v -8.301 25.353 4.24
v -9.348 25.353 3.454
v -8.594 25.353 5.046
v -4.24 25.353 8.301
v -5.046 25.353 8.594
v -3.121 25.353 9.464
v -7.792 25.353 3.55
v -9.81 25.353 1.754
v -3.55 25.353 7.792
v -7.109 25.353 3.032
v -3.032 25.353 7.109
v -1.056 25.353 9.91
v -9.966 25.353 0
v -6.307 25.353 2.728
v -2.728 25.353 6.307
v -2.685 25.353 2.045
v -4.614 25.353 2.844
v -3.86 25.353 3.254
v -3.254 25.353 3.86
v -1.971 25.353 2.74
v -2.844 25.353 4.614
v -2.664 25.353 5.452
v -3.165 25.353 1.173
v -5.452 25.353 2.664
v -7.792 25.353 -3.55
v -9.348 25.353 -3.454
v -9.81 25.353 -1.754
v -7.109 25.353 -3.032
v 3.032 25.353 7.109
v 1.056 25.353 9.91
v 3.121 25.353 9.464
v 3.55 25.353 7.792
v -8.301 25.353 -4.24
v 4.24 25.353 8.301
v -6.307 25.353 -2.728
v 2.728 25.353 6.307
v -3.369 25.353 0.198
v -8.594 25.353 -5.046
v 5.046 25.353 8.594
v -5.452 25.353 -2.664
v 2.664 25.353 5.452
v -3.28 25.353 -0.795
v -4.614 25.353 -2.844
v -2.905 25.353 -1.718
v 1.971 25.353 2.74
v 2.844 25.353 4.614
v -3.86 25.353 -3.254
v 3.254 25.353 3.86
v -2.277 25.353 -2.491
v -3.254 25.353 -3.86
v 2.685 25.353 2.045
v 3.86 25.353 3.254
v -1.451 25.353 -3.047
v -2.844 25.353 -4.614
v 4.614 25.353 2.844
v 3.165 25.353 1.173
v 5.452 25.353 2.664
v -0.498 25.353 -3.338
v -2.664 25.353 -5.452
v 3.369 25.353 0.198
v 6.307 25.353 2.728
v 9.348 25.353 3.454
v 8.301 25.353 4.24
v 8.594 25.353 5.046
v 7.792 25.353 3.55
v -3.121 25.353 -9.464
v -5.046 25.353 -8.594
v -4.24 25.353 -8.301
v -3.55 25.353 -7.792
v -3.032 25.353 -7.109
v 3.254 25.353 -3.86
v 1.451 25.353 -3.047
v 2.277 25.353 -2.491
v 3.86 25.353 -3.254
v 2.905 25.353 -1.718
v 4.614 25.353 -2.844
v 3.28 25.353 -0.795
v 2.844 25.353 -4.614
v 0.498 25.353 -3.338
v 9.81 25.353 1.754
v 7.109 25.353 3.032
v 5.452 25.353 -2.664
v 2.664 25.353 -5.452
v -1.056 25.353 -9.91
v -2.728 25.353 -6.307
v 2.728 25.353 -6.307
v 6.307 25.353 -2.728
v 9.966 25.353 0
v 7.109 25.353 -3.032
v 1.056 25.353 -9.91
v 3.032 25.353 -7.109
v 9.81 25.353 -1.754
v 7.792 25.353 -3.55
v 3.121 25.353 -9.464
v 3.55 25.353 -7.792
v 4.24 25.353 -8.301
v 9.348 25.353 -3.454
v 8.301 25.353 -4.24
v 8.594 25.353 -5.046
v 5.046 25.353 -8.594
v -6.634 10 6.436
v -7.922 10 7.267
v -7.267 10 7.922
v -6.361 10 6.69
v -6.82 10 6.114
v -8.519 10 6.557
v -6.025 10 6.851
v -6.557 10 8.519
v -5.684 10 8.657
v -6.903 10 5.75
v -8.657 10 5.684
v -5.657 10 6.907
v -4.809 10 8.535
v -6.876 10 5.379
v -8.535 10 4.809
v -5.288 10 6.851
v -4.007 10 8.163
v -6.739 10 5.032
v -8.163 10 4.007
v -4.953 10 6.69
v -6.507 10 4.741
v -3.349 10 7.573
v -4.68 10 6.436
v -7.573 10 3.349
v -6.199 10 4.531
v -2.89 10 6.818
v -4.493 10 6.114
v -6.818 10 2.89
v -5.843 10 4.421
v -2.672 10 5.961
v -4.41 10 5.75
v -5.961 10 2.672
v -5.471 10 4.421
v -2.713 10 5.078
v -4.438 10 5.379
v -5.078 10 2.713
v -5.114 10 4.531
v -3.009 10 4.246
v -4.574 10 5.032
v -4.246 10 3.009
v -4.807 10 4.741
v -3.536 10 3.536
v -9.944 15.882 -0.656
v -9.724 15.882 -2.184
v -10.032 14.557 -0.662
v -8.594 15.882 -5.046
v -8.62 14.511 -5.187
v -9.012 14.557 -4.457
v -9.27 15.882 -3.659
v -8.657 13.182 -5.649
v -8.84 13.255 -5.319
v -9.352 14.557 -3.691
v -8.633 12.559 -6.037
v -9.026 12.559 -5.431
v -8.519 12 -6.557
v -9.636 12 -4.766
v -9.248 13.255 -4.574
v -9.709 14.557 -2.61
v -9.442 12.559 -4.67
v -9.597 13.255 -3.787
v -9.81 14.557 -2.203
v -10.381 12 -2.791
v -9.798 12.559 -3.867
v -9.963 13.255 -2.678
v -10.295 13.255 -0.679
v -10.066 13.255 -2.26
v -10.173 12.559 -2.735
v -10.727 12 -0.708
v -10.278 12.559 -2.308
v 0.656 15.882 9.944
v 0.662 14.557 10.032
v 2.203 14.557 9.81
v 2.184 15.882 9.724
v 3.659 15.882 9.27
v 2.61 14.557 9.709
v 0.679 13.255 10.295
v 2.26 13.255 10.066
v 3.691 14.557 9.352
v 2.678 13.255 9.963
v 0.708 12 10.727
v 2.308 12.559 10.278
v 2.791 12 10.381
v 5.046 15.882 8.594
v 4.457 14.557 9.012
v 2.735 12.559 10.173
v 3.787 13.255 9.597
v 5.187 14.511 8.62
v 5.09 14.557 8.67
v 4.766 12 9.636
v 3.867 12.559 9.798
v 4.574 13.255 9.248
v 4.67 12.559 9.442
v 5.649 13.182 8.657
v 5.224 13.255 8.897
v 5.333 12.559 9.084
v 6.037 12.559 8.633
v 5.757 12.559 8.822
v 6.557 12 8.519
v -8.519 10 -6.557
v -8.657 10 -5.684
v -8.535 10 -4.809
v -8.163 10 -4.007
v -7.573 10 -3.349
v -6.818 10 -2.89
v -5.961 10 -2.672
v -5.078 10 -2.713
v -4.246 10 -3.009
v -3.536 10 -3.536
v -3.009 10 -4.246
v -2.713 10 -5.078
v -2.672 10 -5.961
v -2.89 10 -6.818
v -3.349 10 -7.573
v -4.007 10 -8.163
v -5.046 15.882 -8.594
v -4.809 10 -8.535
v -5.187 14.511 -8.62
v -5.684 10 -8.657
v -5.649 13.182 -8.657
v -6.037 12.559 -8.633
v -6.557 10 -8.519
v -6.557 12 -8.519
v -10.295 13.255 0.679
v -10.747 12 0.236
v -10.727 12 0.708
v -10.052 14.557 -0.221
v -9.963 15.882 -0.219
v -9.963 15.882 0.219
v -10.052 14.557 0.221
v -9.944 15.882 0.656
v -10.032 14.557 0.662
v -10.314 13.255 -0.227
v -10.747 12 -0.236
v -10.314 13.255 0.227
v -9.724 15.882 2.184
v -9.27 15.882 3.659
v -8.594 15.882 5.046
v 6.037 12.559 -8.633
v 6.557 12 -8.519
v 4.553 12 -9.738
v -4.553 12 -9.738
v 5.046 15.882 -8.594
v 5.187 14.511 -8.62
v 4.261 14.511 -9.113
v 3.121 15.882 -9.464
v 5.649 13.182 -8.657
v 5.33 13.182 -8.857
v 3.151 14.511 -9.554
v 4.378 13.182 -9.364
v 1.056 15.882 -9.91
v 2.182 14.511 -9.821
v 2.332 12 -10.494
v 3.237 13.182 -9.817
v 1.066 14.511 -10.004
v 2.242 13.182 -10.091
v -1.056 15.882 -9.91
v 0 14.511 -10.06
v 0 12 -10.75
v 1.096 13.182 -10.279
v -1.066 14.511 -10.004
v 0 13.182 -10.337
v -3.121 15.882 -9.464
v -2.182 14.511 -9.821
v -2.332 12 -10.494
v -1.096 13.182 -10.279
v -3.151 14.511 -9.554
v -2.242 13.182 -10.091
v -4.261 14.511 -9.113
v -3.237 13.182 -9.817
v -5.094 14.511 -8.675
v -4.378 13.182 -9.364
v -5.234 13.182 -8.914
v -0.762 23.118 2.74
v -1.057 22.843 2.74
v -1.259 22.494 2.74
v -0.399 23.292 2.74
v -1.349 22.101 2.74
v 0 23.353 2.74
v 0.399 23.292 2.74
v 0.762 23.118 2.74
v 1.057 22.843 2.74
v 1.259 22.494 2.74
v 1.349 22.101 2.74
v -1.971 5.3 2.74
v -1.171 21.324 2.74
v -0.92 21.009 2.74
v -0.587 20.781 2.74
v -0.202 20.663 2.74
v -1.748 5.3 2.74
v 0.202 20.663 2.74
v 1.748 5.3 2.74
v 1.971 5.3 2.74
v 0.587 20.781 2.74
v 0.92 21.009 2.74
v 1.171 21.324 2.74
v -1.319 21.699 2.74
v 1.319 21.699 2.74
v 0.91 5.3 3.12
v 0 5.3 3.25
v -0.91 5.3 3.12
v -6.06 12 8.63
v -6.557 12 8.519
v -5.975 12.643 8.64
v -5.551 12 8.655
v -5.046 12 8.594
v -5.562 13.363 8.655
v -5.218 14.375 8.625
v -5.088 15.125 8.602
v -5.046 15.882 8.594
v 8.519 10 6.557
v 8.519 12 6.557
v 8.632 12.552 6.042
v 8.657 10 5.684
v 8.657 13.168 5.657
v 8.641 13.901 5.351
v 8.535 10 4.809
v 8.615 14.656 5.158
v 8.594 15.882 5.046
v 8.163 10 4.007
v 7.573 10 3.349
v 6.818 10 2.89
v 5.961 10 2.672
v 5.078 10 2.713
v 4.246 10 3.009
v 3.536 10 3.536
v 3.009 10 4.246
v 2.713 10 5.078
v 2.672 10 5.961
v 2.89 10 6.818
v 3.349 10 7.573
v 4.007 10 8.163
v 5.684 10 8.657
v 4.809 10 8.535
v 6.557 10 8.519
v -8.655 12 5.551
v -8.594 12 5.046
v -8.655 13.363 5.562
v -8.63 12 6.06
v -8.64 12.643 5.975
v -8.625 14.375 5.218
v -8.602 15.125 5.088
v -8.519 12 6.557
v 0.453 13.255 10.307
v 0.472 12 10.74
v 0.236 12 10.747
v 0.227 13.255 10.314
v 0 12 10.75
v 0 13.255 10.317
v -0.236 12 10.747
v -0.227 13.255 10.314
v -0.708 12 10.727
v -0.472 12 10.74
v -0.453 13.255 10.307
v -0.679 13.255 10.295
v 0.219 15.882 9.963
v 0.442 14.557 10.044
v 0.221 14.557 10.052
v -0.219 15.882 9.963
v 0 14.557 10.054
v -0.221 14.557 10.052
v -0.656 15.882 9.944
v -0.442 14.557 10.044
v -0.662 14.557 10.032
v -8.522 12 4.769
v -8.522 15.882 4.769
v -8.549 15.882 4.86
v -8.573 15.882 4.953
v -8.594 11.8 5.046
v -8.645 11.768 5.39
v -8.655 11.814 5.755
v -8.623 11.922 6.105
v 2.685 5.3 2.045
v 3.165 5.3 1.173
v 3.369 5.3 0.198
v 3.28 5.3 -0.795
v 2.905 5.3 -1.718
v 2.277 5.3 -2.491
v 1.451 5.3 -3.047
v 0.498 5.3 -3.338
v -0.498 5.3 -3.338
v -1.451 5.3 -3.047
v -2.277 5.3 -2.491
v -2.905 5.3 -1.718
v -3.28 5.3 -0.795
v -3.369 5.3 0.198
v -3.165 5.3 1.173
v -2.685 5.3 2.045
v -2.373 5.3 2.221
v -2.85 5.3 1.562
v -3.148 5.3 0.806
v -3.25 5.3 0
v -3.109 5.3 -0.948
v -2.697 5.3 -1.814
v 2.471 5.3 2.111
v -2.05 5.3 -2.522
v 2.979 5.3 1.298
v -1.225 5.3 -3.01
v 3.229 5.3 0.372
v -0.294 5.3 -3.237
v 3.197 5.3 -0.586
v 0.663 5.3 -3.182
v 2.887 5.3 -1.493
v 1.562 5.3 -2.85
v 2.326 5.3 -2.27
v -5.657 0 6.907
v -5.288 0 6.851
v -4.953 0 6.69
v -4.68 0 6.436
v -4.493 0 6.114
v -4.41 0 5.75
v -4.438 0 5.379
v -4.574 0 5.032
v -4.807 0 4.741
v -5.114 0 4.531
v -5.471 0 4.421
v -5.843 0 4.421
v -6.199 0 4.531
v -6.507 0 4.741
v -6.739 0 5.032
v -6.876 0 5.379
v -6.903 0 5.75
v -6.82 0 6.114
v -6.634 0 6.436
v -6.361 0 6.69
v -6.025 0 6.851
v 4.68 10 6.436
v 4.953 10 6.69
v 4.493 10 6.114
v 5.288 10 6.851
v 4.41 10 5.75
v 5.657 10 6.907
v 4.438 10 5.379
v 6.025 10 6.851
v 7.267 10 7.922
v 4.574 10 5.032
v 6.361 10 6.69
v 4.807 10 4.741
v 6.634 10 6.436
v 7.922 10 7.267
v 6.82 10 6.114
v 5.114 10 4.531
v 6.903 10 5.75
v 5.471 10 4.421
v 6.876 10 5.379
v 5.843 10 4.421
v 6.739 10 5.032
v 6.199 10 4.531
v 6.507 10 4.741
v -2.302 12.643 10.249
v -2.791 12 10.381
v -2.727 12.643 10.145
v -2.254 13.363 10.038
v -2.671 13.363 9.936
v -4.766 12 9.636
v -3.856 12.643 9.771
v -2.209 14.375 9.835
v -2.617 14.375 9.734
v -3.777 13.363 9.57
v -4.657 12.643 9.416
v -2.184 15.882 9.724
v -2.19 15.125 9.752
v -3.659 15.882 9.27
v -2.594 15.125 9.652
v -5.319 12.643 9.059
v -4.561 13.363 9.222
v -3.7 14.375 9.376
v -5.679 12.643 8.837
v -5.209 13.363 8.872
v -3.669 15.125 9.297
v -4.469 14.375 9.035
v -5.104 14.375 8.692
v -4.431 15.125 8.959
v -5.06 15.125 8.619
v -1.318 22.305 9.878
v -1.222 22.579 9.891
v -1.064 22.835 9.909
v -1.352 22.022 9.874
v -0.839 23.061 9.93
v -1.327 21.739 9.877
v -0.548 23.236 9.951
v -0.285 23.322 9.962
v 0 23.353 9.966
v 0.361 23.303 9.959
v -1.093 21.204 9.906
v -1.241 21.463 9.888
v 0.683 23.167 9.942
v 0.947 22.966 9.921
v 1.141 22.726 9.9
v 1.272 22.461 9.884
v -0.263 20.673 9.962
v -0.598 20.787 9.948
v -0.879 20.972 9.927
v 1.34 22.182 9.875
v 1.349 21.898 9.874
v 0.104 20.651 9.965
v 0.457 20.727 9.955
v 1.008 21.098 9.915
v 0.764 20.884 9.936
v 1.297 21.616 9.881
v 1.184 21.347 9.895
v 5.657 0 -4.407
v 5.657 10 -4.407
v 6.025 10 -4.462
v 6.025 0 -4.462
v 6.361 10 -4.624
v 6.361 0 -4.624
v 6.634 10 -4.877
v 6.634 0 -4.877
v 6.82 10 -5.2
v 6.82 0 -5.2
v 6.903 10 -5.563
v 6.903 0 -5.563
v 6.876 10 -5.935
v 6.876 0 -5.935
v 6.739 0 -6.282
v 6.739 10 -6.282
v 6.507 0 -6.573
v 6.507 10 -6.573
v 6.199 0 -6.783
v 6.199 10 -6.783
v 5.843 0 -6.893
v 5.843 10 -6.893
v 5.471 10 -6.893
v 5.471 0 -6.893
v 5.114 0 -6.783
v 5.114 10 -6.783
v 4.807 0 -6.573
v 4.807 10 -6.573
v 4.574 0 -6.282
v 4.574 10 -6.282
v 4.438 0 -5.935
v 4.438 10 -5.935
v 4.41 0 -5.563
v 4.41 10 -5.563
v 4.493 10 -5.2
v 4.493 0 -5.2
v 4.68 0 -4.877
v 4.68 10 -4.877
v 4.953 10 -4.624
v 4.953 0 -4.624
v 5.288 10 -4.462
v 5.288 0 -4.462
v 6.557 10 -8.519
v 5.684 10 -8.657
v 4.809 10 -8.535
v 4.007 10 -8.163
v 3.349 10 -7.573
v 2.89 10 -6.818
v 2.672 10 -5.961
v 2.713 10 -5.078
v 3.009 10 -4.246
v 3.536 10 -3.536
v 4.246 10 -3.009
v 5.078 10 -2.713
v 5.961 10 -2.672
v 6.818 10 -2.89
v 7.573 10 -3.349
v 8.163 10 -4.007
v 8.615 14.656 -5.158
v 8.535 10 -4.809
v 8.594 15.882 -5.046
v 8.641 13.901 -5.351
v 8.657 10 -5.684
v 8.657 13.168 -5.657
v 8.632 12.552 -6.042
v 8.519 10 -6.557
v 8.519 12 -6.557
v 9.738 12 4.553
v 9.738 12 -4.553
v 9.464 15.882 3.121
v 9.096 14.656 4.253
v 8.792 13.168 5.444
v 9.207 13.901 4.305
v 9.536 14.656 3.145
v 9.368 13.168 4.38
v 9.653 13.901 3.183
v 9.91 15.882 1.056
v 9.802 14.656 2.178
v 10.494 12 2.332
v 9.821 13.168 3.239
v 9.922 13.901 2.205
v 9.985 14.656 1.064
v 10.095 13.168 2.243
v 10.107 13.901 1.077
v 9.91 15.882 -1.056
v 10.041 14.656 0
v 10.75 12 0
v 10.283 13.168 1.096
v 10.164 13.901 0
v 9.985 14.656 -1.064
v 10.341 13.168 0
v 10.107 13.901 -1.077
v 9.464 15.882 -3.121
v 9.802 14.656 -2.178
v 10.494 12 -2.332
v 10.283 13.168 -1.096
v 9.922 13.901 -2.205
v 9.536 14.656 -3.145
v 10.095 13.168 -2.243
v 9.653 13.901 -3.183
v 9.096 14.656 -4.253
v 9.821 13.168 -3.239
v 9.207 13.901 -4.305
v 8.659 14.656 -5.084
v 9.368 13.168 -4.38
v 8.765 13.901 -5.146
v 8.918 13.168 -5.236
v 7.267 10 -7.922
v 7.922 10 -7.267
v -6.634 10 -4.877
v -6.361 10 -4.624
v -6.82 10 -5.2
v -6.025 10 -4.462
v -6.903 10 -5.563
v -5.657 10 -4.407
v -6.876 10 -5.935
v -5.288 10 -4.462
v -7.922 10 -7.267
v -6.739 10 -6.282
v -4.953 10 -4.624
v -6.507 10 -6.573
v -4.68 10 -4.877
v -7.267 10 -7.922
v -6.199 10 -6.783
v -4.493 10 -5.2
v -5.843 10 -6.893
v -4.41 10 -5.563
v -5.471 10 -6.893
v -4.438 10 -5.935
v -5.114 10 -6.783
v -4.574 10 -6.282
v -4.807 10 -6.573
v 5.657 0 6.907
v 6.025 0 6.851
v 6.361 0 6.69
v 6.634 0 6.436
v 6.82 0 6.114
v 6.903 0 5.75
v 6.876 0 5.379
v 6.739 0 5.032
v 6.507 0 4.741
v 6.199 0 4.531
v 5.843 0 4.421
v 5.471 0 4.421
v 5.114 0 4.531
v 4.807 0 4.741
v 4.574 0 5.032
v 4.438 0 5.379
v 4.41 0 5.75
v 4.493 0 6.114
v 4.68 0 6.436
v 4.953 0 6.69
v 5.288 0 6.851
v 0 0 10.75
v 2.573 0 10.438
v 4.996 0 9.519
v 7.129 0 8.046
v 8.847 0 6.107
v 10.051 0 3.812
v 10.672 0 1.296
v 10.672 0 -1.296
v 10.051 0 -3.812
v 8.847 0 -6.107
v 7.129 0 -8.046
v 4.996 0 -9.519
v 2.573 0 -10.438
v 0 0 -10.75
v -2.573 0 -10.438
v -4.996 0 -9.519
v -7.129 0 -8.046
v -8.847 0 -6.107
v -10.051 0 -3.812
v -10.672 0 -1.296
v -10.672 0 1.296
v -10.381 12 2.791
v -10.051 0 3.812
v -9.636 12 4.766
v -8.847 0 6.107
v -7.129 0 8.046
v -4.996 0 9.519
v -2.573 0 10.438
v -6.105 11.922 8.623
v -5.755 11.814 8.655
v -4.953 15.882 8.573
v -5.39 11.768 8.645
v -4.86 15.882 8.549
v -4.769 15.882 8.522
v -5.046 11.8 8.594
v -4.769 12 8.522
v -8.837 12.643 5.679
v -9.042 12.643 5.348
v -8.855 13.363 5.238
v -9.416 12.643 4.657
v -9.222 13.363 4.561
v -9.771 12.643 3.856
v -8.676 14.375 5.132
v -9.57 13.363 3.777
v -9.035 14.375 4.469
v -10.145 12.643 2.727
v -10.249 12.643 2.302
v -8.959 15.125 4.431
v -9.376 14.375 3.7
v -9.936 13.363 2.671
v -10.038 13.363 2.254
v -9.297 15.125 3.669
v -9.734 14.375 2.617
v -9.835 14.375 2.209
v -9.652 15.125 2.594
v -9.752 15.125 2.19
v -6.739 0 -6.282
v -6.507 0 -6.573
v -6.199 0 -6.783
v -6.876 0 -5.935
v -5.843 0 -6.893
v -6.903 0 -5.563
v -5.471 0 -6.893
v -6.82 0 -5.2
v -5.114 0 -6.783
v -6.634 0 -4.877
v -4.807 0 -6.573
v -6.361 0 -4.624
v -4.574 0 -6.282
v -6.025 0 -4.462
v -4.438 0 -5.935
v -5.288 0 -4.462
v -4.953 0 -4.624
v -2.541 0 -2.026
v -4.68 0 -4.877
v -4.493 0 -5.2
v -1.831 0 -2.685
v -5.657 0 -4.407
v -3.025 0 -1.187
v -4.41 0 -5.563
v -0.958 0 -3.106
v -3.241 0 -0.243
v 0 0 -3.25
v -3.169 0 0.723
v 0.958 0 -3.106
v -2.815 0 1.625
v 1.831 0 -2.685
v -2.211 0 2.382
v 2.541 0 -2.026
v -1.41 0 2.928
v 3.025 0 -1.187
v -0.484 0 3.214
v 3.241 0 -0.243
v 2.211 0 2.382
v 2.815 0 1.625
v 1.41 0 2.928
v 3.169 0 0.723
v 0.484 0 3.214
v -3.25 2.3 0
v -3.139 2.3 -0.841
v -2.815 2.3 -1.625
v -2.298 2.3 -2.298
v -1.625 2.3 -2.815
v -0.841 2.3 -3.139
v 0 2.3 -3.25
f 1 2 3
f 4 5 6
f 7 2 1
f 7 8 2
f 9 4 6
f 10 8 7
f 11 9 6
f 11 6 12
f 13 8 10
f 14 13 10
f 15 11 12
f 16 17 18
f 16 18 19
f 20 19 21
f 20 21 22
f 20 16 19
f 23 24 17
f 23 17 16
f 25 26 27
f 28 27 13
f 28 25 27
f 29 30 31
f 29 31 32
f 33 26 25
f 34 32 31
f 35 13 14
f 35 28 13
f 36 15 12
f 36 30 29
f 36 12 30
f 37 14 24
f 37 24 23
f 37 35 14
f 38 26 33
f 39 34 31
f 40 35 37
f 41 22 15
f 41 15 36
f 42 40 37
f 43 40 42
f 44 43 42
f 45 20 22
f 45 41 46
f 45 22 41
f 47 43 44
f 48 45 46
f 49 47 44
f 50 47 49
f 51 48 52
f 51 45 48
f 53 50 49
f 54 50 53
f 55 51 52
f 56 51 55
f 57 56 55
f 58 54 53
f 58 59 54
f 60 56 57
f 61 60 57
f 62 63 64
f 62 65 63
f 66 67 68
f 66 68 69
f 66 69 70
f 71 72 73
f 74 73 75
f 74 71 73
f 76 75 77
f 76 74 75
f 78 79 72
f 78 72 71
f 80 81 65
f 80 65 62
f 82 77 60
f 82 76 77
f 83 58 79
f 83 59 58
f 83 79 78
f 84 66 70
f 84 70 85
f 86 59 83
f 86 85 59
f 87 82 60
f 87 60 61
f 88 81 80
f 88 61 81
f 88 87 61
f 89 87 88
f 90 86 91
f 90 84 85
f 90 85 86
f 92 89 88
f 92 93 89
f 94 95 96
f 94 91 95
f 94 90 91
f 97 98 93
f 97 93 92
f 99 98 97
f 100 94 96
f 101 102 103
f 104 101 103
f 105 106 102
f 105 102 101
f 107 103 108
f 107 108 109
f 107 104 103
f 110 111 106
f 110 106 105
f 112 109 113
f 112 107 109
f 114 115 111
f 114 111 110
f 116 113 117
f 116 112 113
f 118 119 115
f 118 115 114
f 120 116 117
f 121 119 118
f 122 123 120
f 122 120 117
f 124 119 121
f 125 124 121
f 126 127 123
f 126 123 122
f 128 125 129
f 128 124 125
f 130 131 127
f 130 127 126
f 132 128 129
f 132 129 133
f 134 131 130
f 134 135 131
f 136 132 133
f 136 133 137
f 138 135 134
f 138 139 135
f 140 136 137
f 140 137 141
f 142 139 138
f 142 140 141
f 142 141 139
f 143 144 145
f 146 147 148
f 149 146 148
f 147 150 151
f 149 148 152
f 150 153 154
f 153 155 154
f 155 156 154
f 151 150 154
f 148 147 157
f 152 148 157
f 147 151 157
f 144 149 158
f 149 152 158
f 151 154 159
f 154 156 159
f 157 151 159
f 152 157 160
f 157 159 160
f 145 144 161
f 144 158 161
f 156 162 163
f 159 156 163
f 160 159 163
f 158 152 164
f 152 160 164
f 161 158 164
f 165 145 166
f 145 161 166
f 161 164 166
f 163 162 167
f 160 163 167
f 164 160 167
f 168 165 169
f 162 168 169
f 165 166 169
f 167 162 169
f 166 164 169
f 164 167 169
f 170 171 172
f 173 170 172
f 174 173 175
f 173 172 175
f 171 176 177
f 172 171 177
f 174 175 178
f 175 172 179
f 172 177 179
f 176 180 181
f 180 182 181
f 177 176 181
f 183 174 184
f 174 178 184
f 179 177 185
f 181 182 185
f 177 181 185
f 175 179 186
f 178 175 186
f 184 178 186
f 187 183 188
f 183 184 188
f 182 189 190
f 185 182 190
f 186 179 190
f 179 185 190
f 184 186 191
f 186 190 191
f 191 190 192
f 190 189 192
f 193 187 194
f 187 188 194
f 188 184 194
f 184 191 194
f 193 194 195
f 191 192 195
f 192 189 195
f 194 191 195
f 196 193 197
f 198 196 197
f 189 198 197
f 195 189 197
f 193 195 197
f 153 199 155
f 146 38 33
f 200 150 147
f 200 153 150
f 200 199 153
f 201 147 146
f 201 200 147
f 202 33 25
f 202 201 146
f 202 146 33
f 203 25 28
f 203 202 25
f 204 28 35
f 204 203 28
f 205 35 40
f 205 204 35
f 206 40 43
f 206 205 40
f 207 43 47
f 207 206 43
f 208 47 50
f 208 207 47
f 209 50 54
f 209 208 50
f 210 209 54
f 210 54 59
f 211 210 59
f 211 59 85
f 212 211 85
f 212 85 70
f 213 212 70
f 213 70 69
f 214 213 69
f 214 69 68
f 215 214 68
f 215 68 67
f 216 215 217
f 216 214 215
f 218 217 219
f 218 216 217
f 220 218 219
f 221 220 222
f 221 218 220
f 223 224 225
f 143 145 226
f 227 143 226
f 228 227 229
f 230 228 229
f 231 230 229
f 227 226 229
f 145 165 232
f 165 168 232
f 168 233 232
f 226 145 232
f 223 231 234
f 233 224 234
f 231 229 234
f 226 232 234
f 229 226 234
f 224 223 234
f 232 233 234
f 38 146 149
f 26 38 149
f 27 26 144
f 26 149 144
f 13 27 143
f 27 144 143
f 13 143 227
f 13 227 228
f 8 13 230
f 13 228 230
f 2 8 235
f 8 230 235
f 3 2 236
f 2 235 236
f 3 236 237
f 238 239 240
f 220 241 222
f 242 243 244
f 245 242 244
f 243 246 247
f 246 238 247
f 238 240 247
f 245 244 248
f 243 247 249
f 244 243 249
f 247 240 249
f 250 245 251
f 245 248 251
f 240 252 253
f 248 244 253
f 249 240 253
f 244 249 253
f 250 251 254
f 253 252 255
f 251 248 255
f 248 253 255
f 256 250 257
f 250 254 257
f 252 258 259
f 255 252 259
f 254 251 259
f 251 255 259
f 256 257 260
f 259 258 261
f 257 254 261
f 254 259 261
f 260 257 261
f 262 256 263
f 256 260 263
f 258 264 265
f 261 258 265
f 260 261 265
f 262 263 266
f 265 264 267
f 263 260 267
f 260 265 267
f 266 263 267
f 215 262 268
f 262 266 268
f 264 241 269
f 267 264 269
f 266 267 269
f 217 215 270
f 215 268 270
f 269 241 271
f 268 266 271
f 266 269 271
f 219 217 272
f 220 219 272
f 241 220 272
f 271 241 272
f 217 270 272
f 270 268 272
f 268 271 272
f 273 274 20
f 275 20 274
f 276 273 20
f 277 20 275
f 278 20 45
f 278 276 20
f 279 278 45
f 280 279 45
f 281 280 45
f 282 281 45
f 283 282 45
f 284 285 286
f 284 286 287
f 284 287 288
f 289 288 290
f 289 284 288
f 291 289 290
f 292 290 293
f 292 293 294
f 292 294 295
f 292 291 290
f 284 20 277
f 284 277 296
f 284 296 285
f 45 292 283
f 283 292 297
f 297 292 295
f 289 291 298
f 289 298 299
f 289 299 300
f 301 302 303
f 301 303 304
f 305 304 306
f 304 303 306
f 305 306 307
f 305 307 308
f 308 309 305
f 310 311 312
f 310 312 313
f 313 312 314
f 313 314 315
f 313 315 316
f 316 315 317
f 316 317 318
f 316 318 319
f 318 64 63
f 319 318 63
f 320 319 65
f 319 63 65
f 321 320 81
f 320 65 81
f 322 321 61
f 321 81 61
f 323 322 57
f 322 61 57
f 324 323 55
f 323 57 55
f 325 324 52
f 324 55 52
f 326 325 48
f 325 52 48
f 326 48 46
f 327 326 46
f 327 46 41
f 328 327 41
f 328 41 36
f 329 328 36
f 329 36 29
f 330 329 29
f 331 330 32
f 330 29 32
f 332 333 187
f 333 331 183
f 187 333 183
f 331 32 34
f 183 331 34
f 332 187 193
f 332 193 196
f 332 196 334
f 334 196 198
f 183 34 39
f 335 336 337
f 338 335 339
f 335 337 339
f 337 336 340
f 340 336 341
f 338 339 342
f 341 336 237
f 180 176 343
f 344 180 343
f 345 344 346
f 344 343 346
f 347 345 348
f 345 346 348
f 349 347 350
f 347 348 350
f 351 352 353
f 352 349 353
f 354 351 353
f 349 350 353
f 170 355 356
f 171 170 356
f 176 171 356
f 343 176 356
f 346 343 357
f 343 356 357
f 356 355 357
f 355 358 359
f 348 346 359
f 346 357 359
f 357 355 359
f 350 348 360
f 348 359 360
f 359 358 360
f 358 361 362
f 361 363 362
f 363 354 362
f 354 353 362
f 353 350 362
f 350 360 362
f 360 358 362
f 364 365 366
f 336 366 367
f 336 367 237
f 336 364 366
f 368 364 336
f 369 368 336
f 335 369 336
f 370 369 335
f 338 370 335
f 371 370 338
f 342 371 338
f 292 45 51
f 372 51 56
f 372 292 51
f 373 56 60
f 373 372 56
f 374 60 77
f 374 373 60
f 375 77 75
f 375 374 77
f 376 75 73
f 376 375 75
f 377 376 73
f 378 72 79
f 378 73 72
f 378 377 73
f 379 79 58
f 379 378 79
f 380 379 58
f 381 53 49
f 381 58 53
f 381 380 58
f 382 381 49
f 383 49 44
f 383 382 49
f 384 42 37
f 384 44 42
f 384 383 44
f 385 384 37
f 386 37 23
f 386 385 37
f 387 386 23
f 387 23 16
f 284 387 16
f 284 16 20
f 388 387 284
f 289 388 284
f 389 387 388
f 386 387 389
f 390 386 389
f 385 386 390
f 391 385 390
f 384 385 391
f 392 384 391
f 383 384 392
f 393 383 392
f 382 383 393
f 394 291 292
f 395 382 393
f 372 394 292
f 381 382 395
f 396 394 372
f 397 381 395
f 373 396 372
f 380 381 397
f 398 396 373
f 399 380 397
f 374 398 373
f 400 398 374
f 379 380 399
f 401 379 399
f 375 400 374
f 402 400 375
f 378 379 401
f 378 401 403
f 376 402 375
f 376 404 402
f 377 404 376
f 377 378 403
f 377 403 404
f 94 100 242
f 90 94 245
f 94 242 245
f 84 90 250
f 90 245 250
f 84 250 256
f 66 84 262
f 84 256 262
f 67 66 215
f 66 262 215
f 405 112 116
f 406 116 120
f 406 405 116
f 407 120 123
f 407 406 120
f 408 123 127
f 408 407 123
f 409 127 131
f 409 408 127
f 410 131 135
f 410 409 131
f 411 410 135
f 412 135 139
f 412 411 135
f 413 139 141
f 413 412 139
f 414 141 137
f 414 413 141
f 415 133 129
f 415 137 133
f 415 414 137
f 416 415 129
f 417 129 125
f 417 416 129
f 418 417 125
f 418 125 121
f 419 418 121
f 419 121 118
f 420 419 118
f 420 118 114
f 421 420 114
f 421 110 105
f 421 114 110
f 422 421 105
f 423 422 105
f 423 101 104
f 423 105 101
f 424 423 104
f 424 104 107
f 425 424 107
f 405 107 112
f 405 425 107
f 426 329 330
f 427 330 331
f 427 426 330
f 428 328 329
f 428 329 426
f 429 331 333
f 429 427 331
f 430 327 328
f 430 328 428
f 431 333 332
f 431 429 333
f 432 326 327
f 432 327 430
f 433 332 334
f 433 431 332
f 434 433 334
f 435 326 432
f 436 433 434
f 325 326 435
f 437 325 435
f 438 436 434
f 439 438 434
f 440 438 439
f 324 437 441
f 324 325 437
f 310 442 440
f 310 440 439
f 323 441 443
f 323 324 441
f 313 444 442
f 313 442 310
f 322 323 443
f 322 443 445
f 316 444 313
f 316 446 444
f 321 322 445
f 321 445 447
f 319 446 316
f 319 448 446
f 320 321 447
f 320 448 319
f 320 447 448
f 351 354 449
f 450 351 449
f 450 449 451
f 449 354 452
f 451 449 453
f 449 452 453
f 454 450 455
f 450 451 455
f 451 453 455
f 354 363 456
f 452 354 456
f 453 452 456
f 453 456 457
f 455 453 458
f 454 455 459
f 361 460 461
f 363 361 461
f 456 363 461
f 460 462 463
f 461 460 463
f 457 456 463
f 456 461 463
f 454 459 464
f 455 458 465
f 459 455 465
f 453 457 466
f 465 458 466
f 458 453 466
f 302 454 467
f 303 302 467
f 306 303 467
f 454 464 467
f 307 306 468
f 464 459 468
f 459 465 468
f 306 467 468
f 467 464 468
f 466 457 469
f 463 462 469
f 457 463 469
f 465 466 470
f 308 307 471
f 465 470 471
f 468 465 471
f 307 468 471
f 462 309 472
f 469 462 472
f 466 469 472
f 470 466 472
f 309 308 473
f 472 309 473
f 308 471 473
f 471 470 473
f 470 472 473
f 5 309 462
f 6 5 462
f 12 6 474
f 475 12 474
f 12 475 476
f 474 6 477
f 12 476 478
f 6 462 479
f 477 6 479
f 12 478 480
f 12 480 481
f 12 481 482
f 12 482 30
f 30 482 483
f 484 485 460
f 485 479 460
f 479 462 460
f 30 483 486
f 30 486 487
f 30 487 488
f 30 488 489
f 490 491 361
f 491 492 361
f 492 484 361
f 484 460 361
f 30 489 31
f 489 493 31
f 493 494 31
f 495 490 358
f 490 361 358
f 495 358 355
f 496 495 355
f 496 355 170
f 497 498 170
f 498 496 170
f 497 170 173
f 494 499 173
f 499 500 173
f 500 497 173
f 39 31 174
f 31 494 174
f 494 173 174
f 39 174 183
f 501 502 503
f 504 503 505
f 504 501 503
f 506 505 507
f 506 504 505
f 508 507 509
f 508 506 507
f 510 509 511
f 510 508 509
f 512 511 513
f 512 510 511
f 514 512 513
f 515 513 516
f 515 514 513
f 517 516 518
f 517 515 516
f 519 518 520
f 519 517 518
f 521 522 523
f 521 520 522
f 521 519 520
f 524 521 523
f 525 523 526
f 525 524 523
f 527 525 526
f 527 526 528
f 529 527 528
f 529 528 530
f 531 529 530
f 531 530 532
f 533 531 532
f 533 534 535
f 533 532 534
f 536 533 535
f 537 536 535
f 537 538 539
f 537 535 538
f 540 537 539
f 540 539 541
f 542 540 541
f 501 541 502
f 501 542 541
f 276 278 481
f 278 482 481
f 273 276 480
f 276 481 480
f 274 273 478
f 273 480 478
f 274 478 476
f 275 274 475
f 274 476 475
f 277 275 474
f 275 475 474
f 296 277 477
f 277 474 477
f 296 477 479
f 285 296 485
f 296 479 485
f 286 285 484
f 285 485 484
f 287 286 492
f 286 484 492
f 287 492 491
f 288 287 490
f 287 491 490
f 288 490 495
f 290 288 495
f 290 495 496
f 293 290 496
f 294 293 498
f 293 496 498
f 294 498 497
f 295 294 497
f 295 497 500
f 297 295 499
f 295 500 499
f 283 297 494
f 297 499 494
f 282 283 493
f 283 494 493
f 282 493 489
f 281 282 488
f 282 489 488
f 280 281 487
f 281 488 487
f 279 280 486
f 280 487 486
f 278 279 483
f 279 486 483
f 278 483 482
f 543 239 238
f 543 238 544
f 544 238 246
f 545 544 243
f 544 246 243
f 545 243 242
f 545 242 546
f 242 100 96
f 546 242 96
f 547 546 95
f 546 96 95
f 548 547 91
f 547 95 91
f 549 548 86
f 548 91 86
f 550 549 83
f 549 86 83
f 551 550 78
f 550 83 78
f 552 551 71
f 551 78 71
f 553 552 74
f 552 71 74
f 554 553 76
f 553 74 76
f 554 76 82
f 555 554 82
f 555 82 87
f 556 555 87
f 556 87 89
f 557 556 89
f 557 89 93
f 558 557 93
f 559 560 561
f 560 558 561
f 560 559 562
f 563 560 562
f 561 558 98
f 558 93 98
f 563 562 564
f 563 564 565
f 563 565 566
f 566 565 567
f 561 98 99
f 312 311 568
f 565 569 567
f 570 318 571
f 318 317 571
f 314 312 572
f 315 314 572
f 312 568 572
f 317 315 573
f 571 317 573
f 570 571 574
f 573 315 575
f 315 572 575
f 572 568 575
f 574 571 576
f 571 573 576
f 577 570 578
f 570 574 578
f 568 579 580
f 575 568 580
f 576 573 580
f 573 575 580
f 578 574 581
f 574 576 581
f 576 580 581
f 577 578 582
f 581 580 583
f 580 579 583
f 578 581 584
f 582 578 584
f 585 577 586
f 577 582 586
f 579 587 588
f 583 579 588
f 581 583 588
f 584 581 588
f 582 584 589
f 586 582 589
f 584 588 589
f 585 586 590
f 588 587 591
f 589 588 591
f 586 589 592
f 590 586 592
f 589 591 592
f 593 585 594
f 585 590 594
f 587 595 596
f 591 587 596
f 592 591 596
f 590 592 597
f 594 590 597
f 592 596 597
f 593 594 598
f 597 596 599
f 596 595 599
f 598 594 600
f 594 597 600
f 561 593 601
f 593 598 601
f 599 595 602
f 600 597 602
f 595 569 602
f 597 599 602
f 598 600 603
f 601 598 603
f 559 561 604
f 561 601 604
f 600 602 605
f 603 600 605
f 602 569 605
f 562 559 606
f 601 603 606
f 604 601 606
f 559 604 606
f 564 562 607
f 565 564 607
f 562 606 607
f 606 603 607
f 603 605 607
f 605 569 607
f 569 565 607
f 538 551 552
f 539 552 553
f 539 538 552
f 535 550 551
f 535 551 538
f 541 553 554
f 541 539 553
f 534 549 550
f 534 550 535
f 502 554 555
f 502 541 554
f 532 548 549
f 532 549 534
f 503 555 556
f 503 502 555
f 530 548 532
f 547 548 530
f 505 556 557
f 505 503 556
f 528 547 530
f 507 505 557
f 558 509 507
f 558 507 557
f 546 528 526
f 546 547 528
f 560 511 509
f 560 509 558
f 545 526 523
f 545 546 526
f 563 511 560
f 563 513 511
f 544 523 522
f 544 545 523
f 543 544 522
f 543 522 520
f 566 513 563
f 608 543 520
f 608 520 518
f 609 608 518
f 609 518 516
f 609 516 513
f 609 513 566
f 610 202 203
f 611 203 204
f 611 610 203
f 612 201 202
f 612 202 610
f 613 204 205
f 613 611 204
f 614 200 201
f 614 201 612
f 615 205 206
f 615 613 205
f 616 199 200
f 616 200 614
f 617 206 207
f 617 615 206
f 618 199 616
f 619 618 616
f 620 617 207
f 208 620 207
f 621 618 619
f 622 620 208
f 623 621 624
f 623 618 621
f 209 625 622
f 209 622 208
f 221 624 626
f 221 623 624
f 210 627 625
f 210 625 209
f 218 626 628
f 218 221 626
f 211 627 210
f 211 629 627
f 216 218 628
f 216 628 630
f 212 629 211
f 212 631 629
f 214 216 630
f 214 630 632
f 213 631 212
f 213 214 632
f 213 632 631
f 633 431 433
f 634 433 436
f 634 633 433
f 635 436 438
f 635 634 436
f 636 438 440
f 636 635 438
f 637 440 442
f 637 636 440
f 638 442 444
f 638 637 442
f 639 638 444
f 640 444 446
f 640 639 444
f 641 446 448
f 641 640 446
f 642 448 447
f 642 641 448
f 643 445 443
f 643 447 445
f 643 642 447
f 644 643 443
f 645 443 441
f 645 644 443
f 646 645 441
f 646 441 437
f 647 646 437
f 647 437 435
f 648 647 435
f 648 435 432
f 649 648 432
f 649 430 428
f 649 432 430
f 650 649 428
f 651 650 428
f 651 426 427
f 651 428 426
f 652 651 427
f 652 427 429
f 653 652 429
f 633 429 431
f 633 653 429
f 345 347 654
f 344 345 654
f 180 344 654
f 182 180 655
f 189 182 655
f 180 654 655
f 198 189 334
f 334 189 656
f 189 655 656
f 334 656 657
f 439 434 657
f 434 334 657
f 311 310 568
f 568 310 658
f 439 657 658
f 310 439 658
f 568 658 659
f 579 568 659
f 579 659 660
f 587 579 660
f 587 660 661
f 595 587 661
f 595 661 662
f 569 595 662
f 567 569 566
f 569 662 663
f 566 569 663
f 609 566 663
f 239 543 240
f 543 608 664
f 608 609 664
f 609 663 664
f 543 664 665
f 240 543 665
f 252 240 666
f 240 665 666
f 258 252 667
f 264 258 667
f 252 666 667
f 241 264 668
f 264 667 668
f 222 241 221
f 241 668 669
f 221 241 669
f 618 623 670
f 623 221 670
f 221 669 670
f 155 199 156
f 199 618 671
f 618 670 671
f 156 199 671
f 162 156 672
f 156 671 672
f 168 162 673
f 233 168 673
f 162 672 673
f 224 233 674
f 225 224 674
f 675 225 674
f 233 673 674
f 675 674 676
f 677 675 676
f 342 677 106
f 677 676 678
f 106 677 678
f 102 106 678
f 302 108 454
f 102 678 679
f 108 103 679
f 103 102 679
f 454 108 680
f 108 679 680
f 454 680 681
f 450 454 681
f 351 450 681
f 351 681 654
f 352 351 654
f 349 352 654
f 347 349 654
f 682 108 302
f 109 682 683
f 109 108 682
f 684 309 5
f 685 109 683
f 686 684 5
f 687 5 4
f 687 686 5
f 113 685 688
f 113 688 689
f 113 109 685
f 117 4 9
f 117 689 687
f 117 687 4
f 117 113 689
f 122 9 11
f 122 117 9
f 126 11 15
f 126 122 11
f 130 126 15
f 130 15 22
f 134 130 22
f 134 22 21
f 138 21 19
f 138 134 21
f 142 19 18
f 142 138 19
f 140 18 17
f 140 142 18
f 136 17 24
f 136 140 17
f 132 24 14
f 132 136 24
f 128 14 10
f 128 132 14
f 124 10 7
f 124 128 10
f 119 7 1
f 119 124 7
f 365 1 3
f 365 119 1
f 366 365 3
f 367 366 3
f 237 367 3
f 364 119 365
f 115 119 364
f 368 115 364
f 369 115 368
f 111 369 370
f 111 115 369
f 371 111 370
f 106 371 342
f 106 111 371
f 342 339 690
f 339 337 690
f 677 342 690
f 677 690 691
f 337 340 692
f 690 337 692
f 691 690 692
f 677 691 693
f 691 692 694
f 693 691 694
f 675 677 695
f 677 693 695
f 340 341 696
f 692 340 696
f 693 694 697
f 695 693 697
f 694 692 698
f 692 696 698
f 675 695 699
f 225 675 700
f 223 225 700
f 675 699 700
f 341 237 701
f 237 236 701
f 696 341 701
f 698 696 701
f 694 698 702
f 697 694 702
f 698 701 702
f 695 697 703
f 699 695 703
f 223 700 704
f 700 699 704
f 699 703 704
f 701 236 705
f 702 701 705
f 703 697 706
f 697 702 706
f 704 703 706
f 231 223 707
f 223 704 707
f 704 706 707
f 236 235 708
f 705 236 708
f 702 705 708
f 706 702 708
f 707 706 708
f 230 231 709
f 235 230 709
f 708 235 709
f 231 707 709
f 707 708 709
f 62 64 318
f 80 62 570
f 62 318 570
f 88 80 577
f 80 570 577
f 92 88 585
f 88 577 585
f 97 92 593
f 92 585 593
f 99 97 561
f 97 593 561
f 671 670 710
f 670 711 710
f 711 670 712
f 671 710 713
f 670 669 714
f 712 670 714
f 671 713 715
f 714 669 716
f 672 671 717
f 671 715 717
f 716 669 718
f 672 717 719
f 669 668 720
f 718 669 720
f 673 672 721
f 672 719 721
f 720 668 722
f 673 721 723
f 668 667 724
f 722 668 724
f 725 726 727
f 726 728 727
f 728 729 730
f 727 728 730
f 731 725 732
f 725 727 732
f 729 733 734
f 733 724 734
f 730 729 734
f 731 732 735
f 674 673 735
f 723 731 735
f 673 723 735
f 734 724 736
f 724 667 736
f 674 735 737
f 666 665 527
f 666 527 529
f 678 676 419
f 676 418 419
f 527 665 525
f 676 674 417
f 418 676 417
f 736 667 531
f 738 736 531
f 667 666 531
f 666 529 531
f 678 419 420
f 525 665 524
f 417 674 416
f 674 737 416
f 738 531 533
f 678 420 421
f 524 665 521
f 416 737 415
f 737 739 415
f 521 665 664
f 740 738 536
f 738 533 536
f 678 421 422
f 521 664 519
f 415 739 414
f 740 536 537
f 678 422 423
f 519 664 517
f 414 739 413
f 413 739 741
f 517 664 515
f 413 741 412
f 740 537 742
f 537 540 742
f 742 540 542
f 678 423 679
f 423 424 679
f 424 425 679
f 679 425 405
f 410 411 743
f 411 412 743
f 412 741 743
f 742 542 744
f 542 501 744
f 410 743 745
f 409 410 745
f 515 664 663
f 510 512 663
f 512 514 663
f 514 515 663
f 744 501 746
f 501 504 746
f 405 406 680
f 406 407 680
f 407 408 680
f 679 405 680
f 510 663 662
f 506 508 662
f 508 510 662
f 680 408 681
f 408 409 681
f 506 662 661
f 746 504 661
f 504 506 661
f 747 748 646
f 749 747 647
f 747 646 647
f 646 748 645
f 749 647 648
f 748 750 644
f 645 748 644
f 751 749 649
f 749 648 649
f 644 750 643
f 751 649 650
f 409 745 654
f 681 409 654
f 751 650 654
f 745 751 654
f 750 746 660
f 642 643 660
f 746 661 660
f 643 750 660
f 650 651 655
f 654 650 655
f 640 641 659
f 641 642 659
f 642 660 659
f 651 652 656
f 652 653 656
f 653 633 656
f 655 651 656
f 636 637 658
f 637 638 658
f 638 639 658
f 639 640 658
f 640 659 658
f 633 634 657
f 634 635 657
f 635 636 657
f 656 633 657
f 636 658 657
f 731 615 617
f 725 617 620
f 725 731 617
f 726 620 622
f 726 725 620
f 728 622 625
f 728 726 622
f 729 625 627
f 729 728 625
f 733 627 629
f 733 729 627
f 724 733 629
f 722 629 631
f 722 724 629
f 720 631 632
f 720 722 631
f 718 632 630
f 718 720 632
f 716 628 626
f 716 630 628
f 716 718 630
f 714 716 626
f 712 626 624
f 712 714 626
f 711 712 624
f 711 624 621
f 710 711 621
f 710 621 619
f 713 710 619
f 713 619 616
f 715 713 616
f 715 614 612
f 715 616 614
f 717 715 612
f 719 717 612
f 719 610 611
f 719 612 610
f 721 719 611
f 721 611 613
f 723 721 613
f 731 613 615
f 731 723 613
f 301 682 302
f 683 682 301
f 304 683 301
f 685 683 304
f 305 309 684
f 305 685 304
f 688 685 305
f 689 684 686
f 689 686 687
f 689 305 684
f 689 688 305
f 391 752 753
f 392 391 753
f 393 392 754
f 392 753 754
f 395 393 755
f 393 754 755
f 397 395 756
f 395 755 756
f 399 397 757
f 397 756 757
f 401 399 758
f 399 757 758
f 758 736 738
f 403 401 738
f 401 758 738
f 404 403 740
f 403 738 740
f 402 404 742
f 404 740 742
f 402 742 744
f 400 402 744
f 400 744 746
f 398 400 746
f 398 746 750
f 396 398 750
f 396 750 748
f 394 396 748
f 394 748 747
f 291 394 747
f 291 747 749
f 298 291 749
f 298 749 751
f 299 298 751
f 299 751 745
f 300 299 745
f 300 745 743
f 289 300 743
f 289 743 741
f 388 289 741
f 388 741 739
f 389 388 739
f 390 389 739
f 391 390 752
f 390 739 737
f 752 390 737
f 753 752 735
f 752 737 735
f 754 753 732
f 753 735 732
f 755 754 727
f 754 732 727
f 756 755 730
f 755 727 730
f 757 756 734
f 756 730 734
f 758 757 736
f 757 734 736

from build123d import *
from build123d.topology import SkipClean

# Parameters (mm, degrees)
SKETCH1_R                      = 10.75
SKETCH1_R_2                    = 1.25
BOSS_EXTRUDE1_DEPTH            = 12
SKETCH14_R                     = 3.25
CUT_EXTRUDE3_DEPTH             = 2.3
CBORE_FOR_M3_SHCS2_D           = 3.4
CBORE_FOR_M3_SHCS2_CBORE_D     = 6.5
CBORE_FOR_M3_SHCS2_CBORE_DEPTH = 3
SKETCH3_R                      = 9.965776233
BOSS_EXTRUDE2_DEPTH            = 20
CUT_EXTRUDE2_REACH             = 37.428
CUT_EXTRUDE1_DEPTH             = 26.122201337
CUT_EXTRUDE1_DEPTH_BACK        = 2
SKETCH2_R                      = 3
SKETCH8_W                      = 1.35255
SKETCH8_H                      = 9.965776233
MOVE_START                     = 5.3
MOVE_FACE1_DEPTH               = 26.7
FILLET1_R                      = 10
CUT_EXTRUDE4_DEPTH             = 36.427743517
CUT_EXTRUDE4_DEPTH_BACK        = 36.427743517
SKETCH15_W                     = 19.931552466
SKETCH15_H                     = 6.64745


# Read off the part's stored shape, not the designer's step: Move Face1
with BuildPart() as part:
    # Sketch1 → Boss-Extrude1 (new body)
    with BuildSketch(Plane(origin=(0, 0, 0), x_dir=(1, 0, 0), z_dir=(0, 1, 0))):
        with Locations(Location((0, 0, 0), (0, 0, 270))):
            Circle(SKETCH1_R)
        with Locations(Location((-5.656854249, 5.656854249, 0), (0, 0, 270))):
            Circle(SKETCH1_R_2, mode=Mode.SUBTRACT)
        with Locations(Location((5.656854249, 5.656854249, 0), (0, 0, 270))):
            Circle(SKETCH1_R_2, mode=Mode.SUBTRACT)
        with Locations(Location((5.656854249, -5.656854249, 0), (0, 0, 270))):
            Circle(SKETCH1_R_2, mode=Mode.SUBTRACT)
        with Locations(Location((-5.656854249, -5.656854249, 0), (0, 0, 270))):
            Circle(SKETCH1_R_2, mode=Mode.SUBTRACT)
    extrude(amount=BOSS_EXTRUDE1_DEPTH)

    # Sketch14 → Cut-Extrude3 (cut)
    with BuildSketch(Plane.XZ):
        with Locations(Location((0, 0, 0), (0, 0, 270))):
            Circle(SKETCH14_R)
    extrude(amount=-CUT_EXTRUDE3_DEPTH, mode=Mode.SUBTRACT)

    # CBORE for M3 SHCS2 (through all)
    with Locations(Plane(origin=(0, 2.3, 0), x_dir=(-1, 0, 0), z_dir=(0, -1, 0))):
        with Locations((0, 0)):
            CounterBoreHole(CBORE_FOR_M3_SHCS2_D / 2, CBORE_FOR_M3_SHCS2_CBORE_D / 2, CBORE_FOR_M3_SHCS2_CBORE_DEPTH)

    # Sketch3 → Boss-Extrude2 (add)
    with BuildSketch(Plane(origin=(0, 12, 0), x_dir=(1, 0, 0), z_dir=(0, 1, 0))):
        with Locations(Location((0, 0, 0), (0, 0, 270))):
            Circle(SKETCH3_R)
    extrude(amount=BOSS_EXTRUDE2_DEPTH)

    # Sketch5 → Cut-Extrude2 (cut, up to next)
    with BuildSketch(Plane(origin=(0, 32, 0), x_dir=(1, 0, 0), z_dir=(0, 1, 0)), mode=Mode.PRIVATE) as cut_extrude2_sk1:
        with BuildLine():
            Line((-1.905, -2.54), (1.905, -2.54))
            ThreePointArc((1.905, -2.54), (0, 3.175), (-1.905, -2.54))
        make_face()
    cut_extrude2_tool1 = extrude(cut_extrude2_sk1.sketch, amount=-CUT_EXTRUDE2_REACH, mode=Mode.PRIVATE) & part.part
    add(cut_extrude2_tool1.solids().sort_by_distance((0, 32, -0.153521))[0], mode=Mode.SUBTRACT)

    # Sketch2 → Cut-Extrude1 (cut, two sides: drawn at the far end of the back side and taken through both)
    with BuildSketch(Plane(origin=(0, 12, 0), x_dir=(1, 0, 0), z_dir=(0, 1, 0)).offset(-CUT_EXTRUDE1_DEPTH_BACK)):
        with Locations((-5.656854249, 5.656854249)):
            Circle(SKETCH2_R)
        with Locations((5.656854249, 5.656854249)):
            Circle(SKETCH2_R)
        with Locations((5.656854249, -5.656854249)):
            Circle(SKETCH2_R)
        with Locations((-5.656854249, -5.656854249)):
            Circle(SKETCH2_R)
    extrude(amount=CUT_EXTRUDE1_DEPTH + CUT_EXTRUDE1_DEPTH_BACK, mode=Mode.SUBTRACT)

    # Sketch8 → Tap Drill for M3x0.5 Tap1 (revolve, cut)
    with BuildSketch(Plane(origin=(0, 22, 0), x_dir=(0, 1, 0), z_dir=(1, 0, 0))):
        with Locations((0.676275, 4.982888117)):
            Rectangle(SKETCH8_W, SKETCH8_H)
    revolve(axis=Axis((0, 22, -6.35), (0, 0, 1)), mode=Mode.SUBTRACT)

    # Move Face1 outline → Move Face1 (cut)
    with BuildSketch(Plane(origin=(0, 0, 0), x_dir=(1, 0, 0), z_dir=(0, 1, 0)).offset(MOVE_START)):
        with BuildLine():
            Line((-1.970539266, -2.74), (1.970539266, -2.74))
            ThreePointArc((1.970539266, -2.74), (0, 3.375), (-1.970539266, -2.74))
        make_face()
        with BuildLine():
            ThreePointArc((-1.905, -2.54), (0, 3.175), (1.905, -2.54))
            Line((1.905, -2.54), (-1.905, -2.54))
        make_face(mode=Mode.SUBTRACT)
    extrude(amount=MOVE_FACE1_DEPTH, mode=Mode.SUBTRACT)

    # Fillet1
    # the kernel refuses this fillet: 10 mm, written as the material it adds along each edge
    with BuildSketch(Plane(origin=(0, 12, 0), x_dir=(0.9978298678102888, 0, -0.06584493075174137), z_dir=(0.06584493075174137, 0, 0.9978298678102888))) as fillet1_piece_1_section:
        with BuildLine():
            CenterArc((19.965776233, 3.881941321), FILLET1_R, 180, 22.842179606)
            Line((9.965776233, 3.881941321), (9.765776233, 3.881941321))
            Line((9.765776233, 3.881941321), (9.765776233, 0))
            Line((9.765776233, 0), (9.965776233, -0.2))
            ThreePointArc((9.965776233, -0.2), (10.357888117, -0.2), (10.565684475, -0.077638826))
            Line((10.565684475, -0.077638826), (10.75, 0))
        make_face()
    fillet1_piece_1 = revolve(axis=Axis((0, 12, 0), (0, 1, 0)), revolution_arc=172.449263909, mode=Mode.PRIVATE)
    fillet1_piece_1 = fillet1_piece_1 - Plane(origin=(-5.656854249, 13.230633789, -5.656854249), x_dir=(1, 0, 0), z_dir=(0, 1, 0)) * Cylinder(3, 44, mode=Mode.PRIVATE)
    fillet1_piece_1 = fillet1_piece_1 - Plane(origin=(5.656854249, 13.230633789, -5.656854249), x_dir=(1, 0, 0), z_dir=(0, 1, 0)) * Cylinder(3, 44, mode=Mode.PRIVATE)
    add(fillet1_piece_1)
    with BuildSketch(Plane(origin=(0, 12, 0), x_dir=(0.06584493075180471, 0, 0.9978298678102845), z_dir=(-0.9978298678102845, 0, 0.06584493075180471))) as fillet1_piece_2_section:
        with BuildLine():
            CenterArc((19.965776233, 3.881941321), FILLET1_R, 180, 22.842179606)
            Line((9.965776233, 3.881941321), (9.765776233, 3.881941321))
            Line((9.765776233, 3.881941321), (9.765776233, 0))
            Line((9.765776233, 0), (9.965776233, -0.2))
            ThreePointArc((9.965776233, -0.2), (10.357888116, -0.2), (10.565684475, -0.077638826))
            Line((10.565684475, -0.077638826), (10.75, 0))
        make_face()
    fillet1_piece_2 = revolve(axis=Axis((0, 12, 0), (0, 1, 0)), revolution_arc=172.449263909, mode=Mode.PRIVATE)
    fillet1_piece_2 = fillet1_piece_2 - Plane(origin=(5.656854249, 13.23063377, 5.656854249), x_dir=(1, 0, 0), z_dir=(0, 1, 0)) * Cylinder(3, 43, mode=Mode.PRIVATE)
    fillet1_piece_2 = fillet1_piece_2 - Plane(origin=(5.656854249, 13.23063377, -5.656854249), x_dir=(1, 0, 0), z_dir=(0, 1, 0)) * Cylinder(3, 43, mode=Mode.PRIVATE)
    add(fillet1_piece_2)
    with BuildSketch(Plane(origin=(0, 12, 0), x_dir=(0.9978298678102888, 0, 0.0658449307517424), z_dir=(0.0658449307517424, 0, -0.9978298678102888))) as fillet1_piece_3_section:
        with BuildLine():
            CenterArc((19.965776233, -3.881941321), FILLET1_R, 157.157820394, 22.842179606)
            Line((9.965776233, -3.881941321), (9.765776233, -3.881941321))
            Line((9.765776233, -3.881941321), (9.765776233, 0))
            Line((9.765776233, 0), (9.965776233, 0.2))
            ThreePointArc((9.965776233, 0.2), (10.357888116, 0.2), (10.565684475, 0.077638826))
            Line((10.565684475, 0.077638826), (10.75, 0))
        make_face()
    fillet1_piece_3 = revolve(axis=Axis((0, 12, 0), (0, -1, 0)), revolution_arc=172.449263909, mode=Mode.PRIVATE)
    fillet1_piece_3 = fillet1_piece_3 - Plane(origin=(5.656854249, 13.230633816, 5.656854249), x_dir=(1, 0, 0), z_dir=(0, 1, 0)) * Cylinder(3, 44, mode=Mode.PRIVATE)
    fillet1_piece_3 = fillet1_piece_3 - Plane(origin=(-5.656854249, 13.230633816, 5.656854249), x_dir=(1, 0, 0), z_dir=(0, 1, 0)) * Cylinder(3, 44, mode=Mode.PRIVATE)
    add(fillet1_piece_3)
    with BuildSketch(Plane(origin=(0, 12, 0), x_dir=(-0.06584493075180468, 0, -0.9978298678102845), z_dir=(0.9978298678102845, 0, -0.06584493075180468))) as fillet1_piece_4_section:
        with BuildLine():
            CenterArc((19.965776233, 3.881941321), FILLET1_R, 180, 22.842179606)
            Line((9.965776233, 3.881941321), (9.765776233, 3.881941321))
            Line((9.765776233, 3.881941321), (9.765776233, 0))
            Line((9.765776233, 0), (9.965776233, -0.2))
            ThreePointArc((9.965776233, -0.2), (10.357888116, -0.2), (10.565684475, -0.077638826))
            Line((10.565684475, -0.077638826), (10.75, 0))
        make_face()
    fillet1_piece_4 = revolve(axis=Axis((0, 12, 0), (0, 1, 0)), revolution_arc=172.449263909, mode=Mode.PRIVATE)
    fillet1_piece_4 = fillet1_piece_4 - Plane(origin=(-5.656854249, 13.23063377, 5.656854249), x_dir=(1, 0, 0), z_dir=(0, 1, 0)) * Cylinder(3, 44, mode=Mode.PRIVATE)
    fillet1_piece_4 = fillet1_piece_4 - Plane(origin=(-5.656854249, 13.23063377, -5.656854249), x_dir=(1, 0, 0), z_dir=(0, 1, 0)) * Cylinder(3, 44, mode=Mode.PRIVATE)
    add(fillet1_piece_4)

    # Sketch15 → Cut-Extrude4 (cut, two sides: drawn at the far end of the back side and taken through both)
    with SkipClean():  # the faces are left unmerged after this step: merging them gives an invalid solid
        with BuildSketch(Plane.XY.offset(-CUT_EXTRUDE4_DEPTH_BACK)):
            with Locations((0, 28.676275)):
                Rectangle(SKETCH15_W, SKETCH15_H)
        extrude(amount=CUT_EXTRUDE4_DEPTH + CUT_EXTRUDE4_DEPTH_BACK, mode=Mode.SUBTRACT)


solid = part.part
